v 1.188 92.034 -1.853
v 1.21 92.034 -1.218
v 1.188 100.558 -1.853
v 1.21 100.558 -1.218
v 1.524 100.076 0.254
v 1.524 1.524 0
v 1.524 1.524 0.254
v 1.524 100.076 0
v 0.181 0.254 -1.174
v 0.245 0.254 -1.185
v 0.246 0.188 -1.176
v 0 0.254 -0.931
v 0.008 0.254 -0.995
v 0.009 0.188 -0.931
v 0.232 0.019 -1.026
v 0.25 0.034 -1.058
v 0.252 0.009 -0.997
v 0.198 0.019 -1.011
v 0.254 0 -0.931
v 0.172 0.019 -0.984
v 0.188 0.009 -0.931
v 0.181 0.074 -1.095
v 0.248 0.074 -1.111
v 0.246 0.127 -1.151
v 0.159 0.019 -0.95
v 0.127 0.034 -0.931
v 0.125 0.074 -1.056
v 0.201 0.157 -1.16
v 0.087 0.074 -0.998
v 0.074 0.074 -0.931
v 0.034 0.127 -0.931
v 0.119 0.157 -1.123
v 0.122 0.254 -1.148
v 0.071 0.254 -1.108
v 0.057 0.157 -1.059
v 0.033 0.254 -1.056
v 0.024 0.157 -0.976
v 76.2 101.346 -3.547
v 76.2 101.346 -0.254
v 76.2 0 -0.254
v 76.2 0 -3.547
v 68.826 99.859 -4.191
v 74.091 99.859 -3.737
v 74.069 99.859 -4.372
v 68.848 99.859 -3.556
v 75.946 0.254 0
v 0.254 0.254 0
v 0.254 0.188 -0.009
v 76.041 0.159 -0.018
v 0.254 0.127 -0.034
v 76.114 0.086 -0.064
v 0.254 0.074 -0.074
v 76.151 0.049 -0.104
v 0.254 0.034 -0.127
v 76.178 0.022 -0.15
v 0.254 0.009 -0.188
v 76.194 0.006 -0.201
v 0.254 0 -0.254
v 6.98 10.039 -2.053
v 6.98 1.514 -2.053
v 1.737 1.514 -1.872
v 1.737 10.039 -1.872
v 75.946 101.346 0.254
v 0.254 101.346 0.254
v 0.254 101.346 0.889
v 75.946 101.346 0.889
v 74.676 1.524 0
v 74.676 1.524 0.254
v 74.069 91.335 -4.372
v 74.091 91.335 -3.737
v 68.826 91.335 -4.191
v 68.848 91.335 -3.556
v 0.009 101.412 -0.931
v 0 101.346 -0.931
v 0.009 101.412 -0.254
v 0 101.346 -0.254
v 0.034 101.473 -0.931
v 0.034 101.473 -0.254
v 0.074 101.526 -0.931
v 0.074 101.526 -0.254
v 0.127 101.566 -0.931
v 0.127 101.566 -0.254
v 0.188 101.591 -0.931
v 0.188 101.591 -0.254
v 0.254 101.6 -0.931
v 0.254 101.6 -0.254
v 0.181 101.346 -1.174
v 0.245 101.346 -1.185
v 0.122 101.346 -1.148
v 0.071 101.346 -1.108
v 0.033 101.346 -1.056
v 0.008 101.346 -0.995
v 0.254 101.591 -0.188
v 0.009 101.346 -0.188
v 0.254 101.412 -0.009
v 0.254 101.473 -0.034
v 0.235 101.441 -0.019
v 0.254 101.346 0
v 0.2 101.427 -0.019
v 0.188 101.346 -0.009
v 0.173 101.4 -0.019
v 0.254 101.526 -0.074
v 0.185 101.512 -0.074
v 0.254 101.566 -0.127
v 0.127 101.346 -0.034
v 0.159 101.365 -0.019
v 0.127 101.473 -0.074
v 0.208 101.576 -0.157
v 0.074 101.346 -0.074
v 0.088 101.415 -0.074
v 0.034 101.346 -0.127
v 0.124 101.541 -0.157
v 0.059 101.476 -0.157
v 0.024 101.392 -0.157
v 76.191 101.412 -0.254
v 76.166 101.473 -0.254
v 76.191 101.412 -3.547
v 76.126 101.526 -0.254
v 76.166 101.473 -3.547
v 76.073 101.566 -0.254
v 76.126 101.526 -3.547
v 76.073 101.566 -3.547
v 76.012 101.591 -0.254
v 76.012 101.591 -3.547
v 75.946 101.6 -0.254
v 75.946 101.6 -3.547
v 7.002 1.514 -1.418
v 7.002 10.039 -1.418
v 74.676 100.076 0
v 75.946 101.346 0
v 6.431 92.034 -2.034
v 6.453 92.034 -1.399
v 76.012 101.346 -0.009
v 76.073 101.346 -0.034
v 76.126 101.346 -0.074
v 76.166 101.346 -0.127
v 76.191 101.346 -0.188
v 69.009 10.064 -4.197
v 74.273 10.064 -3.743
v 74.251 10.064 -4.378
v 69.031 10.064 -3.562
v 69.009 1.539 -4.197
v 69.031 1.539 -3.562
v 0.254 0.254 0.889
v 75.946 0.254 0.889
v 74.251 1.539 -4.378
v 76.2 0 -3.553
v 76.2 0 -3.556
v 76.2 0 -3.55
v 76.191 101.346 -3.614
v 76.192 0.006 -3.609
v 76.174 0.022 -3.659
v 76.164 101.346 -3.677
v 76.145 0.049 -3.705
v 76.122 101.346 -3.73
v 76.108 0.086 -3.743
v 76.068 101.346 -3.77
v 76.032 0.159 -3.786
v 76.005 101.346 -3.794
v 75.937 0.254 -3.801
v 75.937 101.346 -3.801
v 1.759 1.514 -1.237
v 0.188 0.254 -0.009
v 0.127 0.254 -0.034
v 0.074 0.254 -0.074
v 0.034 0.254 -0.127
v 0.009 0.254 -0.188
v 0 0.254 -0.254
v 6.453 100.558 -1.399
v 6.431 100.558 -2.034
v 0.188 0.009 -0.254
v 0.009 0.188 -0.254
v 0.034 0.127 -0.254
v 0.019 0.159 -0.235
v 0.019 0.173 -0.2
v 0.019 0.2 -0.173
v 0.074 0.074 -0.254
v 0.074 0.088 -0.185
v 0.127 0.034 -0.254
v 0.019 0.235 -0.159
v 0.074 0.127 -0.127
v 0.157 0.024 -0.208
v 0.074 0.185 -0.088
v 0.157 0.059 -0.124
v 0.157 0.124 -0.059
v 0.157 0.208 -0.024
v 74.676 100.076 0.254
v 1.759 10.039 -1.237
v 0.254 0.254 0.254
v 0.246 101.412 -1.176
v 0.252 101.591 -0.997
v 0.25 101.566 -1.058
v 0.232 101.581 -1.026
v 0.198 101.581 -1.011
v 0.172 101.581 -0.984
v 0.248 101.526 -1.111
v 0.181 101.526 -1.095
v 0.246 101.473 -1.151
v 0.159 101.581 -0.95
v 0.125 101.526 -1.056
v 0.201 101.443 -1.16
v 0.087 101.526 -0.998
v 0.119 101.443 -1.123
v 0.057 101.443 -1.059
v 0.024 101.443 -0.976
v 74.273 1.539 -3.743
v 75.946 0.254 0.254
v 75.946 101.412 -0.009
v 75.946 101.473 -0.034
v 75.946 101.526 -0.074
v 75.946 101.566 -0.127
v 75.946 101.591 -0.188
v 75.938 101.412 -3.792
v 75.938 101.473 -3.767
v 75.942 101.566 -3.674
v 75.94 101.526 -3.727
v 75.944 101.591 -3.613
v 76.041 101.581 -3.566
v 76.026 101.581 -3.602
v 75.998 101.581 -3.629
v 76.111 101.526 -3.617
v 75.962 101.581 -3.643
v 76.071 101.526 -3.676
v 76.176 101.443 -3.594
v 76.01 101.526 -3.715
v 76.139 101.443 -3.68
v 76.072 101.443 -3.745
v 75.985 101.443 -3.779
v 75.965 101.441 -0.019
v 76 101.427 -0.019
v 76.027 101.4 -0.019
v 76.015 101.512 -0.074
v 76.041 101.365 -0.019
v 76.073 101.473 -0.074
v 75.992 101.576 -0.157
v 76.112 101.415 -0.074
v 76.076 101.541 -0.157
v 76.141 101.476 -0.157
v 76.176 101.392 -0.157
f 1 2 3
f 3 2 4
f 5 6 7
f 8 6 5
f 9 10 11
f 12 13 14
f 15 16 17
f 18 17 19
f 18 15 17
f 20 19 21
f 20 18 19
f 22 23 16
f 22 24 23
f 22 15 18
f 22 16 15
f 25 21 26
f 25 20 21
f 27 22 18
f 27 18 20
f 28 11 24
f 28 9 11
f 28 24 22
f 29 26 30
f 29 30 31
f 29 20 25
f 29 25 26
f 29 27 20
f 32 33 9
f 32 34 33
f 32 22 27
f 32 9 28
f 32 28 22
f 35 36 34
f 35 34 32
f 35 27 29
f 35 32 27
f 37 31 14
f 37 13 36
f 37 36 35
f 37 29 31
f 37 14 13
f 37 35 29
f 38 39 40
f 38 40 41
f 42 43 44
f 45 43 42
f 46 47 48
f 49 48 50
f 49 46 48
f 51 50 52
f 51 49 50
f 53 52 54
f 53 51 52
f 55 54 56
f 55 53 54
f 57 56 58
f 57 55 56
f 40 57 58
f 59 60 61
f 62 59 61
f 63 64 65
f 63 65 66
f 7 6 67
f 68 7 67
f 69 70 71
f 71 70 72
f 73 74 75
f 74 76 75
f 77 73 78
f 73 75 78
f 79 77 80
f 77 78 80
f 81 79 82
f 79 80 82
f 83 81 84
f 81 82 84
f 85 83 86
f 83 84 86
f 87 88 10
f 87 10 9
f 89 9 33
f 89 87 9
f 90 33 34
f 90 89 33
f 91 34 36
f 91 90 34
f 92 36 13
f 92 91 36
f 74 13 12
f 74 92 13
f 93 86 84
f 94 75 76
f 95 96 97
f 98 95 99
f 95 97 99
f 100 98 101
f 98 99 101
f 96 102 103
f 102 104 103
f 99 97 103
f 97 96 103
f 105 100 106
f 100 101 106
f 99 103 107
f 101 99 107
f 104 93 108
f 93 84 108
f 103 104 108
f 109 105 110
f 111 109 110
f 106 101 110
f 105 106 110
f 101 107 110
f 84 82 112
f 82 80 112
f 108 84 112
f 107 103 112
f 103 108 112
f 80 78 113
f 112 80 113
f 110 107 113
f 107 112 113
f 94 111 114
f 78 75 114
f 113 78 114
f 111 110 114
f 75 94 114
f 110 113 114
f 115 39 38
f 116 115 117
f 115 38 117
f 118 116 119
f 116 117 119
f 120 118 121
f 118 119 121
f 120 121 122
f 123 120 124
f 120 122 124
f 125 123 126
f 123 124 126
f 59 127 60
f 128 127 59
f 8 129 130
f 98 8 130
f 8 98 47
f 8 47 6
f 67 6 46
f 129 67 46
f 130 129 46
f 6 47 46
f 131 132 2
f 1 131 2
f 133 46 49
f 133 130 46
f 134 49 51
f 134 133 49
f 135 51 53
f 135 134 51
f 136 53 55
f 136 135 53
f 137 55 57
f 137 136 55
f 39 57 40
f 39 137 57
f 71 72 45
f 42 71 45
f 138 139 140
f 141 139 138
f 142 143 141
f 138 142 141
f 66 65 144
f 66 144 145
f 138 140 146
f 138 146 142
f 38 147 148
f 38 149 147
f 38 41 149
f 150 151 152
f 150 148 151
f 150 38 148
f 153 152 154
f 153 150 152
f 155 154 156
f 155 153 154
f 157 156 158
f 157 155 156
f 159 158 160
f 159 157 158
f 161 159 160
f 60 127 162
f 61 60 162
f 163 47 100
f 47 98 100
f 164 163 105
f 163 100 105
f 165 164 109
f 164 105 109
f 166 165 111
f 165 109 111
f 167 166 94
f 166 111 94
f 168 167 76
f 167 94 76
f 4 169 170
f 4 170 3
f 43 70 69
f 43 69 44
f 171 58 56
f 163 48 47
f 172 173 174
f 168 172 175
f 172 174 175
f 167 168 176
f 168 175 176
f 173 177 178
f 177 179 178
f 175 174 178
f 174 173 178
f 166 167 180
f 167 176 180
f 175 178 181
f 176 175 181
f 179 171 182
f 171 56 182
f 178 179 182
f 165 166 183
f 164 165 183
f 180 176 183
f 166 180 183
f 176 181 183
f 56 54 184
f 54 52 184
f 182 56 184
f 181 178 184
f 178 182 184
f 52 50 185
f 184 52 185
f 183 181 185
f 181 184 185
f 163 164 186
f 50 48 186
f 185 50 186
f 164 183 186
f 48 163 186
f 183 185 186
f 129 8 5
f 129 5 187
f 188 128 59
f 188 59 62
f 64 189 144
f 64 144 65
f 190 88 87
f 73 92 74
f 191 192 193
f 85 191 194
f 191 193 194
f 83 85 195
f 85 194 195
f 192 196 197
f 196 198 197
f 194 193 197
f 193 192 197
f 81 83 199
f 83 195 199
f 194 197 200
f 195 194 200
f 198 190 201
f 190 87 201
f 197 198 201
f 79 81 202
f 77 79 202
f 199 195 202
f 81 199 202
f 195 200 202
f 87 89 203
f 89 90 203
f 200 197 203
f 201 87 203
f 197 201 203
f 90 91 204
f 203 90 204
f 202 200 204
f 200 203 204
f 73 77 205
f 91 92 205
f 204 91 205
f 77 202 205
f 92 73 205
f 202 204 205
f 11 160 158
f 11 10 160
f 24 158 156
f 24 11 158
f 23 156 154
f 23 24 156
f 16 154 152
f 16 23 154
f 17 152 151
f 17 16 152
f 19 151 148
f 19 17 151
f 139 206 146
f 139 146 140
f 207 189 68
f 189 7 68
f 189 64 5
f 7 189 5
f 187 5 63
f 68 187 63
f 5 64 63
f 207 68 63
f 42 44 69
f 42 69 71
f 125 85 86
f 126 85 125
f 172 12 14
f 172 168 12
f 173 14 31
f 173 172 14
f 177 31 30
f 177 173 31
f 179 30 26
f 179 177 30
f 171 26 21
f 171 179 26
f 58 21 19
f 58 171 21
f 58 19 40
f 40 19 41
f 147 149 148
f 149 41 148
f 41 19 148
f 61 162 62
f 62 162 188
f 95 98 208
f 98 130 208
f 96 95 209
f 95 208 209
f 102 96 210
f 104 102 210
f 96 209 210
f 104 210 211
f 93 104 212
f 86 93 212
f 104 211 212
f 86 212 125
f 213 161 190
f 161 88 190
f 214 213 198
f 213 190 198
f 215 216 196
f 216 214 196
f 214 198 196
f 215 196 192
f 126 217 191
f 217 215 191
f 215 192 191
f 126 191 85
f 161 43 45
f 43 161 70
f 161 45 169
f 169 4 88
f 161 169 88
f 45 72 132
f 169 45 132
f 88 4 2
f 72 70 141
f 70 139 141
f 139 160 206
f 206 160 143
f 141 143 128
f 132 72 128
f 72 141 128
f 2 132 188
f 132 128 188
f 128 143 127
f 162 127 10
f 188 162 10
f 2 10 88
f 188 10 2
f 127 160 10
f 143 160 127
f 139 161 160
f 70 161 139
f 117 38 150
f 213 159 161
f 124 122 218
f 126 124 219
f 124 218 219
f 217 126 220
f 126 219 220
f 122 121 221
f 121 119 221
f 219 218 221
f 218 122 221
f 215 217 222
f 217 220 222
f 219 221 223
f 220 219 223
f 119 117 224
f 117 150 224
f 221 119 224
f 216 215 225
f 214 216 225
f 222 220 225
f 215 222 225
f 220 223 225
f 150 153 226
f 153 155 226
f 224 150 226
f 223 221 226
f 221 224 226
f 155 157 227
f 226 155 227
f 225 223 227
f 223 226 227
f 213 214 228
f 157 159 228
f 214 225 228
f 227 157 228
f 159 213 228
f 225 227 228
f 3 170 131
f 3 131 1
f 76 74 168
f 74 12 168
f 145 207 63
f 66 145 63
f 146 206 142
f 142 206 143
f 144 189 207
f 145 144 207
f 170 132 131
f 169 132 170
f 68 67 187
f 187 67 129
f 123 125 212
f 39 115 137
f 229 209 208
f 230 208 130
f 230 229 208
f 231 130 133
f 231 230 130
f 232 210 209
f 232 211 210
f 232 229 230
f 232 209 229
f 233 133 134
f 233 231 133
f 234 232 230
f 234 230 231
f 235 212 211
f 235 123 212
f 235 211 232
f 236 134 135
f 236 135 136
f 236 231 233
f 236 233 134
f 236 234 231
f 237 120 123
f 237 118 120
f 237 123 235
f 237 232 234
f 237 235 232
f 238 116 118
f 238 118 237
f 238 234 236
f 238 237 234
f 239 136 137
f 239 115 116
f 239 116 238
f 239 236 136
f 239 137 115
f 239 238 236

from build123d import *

# Parameters (mm, degrees)
BOSS_EXTRUDE1_DEPTH = 101.6
FILLET1_R           = 0.254
SKETCH3_W           = 73.152
SKETCH3_H           = 98.552
BOSS_EXTRUDE2_DEPTH = 0.254
SKETCH4_W           = 75.692
SKETCH4_H           = 101.092
BOSS_EXTRUDE3_DEPTH = 0.635
SKETCH5_W           = 5.245580378
SKETCH5_H           = 8.524068114
SKETCH5_H_2         = 8.524068115
SKETCH5_W_2         = 5.245580379
BOSS_EXTRUDE4_DEPTH = 0.635


with BuildPart() as part:
    # Sketch1 → Boss-Extrude1 (new body)
    with BuildSketch(Plane(origin=(0, 0, 0), x_dir=(1, 0, 0), z_dir=(0, 1, 0))):
        Polygon((0, 0), (76.2, 0), (76.2, 3.81), (0, 1.1764495), align=None)
    extrude(amount=BOSS_EXTRUDE1_DEPTH)

    # Fillet1
    fillet1_edges = [part.edges().sort_by_distance(p)[0] for p in [
        (76.2, 101.6, -1.905),
        (38.1, 101.6, -2.49322475),
        (0, 101.6, -0.58822475),
        (38.1, 0, -2.49322475),
        (38.1, 0, 0),
        (0, 0, -0.58822475),
        (38.1, 101.6, 0),
        (0, 50.8, -1.1764495),
        (76.2, 50.8, -3.81),
        (76.2, 50.8, 0),
        (0, 50.8, 0),
    ]]
    fillet(fillet1_edges, radius=FILLET1_R)

    # Sketch3 → Boss-Extrude2 (add)
    with BuildSketch(Plane.XY):
        with Locations((38.1, 50.8)):
            Rectangle(SKETCH3_W, SKETCH3_H)
    extrude(amount=BOSS_EXTRUDE2_DEPTH)

    # Sketch4 → Boss-Extrude3 (add)
    with BuildSketch(Plane.XY.offset(0.254)):
        with Locations((38.1, 50.8)):
            Rectangle(SKETCH4_W, SKETCH4_H)
    extrude(amount=BOSS_EXTRUDE3_DEPTH)

    # Sketch5 → Boss-Extrude4 (add)
    with BuildSketch(Plane(origin=(-0.040610799, 0, -1.175045949), x_dir=(-0.9994033020943162, 0, 0.034540407684001274), z_dir=(-0.034540407684001274, 0, -0.9994033020943162))):
        with Locations((-3.874536836, 96.295602006)):
            Rectangle(SKETCH5_W, SKETCH5_H)
        with Locations((-71.552678444, 95.59737493)):
            Rectangle(SKETCH5_W, SKETCH5_H_2)
        with Locations((-71.735567304, 5.801534056)):
            Rectangle(SKETCH5_W, SKETCH5_H_2)
        with Locations((-4.423527668, 5.776498119)):
            Rectangle(SKETCH5_W_2, SKETCH5_H)
    extrude(amount=BOSS_EXTRUDE4_DEPTH)


solid = part.part
